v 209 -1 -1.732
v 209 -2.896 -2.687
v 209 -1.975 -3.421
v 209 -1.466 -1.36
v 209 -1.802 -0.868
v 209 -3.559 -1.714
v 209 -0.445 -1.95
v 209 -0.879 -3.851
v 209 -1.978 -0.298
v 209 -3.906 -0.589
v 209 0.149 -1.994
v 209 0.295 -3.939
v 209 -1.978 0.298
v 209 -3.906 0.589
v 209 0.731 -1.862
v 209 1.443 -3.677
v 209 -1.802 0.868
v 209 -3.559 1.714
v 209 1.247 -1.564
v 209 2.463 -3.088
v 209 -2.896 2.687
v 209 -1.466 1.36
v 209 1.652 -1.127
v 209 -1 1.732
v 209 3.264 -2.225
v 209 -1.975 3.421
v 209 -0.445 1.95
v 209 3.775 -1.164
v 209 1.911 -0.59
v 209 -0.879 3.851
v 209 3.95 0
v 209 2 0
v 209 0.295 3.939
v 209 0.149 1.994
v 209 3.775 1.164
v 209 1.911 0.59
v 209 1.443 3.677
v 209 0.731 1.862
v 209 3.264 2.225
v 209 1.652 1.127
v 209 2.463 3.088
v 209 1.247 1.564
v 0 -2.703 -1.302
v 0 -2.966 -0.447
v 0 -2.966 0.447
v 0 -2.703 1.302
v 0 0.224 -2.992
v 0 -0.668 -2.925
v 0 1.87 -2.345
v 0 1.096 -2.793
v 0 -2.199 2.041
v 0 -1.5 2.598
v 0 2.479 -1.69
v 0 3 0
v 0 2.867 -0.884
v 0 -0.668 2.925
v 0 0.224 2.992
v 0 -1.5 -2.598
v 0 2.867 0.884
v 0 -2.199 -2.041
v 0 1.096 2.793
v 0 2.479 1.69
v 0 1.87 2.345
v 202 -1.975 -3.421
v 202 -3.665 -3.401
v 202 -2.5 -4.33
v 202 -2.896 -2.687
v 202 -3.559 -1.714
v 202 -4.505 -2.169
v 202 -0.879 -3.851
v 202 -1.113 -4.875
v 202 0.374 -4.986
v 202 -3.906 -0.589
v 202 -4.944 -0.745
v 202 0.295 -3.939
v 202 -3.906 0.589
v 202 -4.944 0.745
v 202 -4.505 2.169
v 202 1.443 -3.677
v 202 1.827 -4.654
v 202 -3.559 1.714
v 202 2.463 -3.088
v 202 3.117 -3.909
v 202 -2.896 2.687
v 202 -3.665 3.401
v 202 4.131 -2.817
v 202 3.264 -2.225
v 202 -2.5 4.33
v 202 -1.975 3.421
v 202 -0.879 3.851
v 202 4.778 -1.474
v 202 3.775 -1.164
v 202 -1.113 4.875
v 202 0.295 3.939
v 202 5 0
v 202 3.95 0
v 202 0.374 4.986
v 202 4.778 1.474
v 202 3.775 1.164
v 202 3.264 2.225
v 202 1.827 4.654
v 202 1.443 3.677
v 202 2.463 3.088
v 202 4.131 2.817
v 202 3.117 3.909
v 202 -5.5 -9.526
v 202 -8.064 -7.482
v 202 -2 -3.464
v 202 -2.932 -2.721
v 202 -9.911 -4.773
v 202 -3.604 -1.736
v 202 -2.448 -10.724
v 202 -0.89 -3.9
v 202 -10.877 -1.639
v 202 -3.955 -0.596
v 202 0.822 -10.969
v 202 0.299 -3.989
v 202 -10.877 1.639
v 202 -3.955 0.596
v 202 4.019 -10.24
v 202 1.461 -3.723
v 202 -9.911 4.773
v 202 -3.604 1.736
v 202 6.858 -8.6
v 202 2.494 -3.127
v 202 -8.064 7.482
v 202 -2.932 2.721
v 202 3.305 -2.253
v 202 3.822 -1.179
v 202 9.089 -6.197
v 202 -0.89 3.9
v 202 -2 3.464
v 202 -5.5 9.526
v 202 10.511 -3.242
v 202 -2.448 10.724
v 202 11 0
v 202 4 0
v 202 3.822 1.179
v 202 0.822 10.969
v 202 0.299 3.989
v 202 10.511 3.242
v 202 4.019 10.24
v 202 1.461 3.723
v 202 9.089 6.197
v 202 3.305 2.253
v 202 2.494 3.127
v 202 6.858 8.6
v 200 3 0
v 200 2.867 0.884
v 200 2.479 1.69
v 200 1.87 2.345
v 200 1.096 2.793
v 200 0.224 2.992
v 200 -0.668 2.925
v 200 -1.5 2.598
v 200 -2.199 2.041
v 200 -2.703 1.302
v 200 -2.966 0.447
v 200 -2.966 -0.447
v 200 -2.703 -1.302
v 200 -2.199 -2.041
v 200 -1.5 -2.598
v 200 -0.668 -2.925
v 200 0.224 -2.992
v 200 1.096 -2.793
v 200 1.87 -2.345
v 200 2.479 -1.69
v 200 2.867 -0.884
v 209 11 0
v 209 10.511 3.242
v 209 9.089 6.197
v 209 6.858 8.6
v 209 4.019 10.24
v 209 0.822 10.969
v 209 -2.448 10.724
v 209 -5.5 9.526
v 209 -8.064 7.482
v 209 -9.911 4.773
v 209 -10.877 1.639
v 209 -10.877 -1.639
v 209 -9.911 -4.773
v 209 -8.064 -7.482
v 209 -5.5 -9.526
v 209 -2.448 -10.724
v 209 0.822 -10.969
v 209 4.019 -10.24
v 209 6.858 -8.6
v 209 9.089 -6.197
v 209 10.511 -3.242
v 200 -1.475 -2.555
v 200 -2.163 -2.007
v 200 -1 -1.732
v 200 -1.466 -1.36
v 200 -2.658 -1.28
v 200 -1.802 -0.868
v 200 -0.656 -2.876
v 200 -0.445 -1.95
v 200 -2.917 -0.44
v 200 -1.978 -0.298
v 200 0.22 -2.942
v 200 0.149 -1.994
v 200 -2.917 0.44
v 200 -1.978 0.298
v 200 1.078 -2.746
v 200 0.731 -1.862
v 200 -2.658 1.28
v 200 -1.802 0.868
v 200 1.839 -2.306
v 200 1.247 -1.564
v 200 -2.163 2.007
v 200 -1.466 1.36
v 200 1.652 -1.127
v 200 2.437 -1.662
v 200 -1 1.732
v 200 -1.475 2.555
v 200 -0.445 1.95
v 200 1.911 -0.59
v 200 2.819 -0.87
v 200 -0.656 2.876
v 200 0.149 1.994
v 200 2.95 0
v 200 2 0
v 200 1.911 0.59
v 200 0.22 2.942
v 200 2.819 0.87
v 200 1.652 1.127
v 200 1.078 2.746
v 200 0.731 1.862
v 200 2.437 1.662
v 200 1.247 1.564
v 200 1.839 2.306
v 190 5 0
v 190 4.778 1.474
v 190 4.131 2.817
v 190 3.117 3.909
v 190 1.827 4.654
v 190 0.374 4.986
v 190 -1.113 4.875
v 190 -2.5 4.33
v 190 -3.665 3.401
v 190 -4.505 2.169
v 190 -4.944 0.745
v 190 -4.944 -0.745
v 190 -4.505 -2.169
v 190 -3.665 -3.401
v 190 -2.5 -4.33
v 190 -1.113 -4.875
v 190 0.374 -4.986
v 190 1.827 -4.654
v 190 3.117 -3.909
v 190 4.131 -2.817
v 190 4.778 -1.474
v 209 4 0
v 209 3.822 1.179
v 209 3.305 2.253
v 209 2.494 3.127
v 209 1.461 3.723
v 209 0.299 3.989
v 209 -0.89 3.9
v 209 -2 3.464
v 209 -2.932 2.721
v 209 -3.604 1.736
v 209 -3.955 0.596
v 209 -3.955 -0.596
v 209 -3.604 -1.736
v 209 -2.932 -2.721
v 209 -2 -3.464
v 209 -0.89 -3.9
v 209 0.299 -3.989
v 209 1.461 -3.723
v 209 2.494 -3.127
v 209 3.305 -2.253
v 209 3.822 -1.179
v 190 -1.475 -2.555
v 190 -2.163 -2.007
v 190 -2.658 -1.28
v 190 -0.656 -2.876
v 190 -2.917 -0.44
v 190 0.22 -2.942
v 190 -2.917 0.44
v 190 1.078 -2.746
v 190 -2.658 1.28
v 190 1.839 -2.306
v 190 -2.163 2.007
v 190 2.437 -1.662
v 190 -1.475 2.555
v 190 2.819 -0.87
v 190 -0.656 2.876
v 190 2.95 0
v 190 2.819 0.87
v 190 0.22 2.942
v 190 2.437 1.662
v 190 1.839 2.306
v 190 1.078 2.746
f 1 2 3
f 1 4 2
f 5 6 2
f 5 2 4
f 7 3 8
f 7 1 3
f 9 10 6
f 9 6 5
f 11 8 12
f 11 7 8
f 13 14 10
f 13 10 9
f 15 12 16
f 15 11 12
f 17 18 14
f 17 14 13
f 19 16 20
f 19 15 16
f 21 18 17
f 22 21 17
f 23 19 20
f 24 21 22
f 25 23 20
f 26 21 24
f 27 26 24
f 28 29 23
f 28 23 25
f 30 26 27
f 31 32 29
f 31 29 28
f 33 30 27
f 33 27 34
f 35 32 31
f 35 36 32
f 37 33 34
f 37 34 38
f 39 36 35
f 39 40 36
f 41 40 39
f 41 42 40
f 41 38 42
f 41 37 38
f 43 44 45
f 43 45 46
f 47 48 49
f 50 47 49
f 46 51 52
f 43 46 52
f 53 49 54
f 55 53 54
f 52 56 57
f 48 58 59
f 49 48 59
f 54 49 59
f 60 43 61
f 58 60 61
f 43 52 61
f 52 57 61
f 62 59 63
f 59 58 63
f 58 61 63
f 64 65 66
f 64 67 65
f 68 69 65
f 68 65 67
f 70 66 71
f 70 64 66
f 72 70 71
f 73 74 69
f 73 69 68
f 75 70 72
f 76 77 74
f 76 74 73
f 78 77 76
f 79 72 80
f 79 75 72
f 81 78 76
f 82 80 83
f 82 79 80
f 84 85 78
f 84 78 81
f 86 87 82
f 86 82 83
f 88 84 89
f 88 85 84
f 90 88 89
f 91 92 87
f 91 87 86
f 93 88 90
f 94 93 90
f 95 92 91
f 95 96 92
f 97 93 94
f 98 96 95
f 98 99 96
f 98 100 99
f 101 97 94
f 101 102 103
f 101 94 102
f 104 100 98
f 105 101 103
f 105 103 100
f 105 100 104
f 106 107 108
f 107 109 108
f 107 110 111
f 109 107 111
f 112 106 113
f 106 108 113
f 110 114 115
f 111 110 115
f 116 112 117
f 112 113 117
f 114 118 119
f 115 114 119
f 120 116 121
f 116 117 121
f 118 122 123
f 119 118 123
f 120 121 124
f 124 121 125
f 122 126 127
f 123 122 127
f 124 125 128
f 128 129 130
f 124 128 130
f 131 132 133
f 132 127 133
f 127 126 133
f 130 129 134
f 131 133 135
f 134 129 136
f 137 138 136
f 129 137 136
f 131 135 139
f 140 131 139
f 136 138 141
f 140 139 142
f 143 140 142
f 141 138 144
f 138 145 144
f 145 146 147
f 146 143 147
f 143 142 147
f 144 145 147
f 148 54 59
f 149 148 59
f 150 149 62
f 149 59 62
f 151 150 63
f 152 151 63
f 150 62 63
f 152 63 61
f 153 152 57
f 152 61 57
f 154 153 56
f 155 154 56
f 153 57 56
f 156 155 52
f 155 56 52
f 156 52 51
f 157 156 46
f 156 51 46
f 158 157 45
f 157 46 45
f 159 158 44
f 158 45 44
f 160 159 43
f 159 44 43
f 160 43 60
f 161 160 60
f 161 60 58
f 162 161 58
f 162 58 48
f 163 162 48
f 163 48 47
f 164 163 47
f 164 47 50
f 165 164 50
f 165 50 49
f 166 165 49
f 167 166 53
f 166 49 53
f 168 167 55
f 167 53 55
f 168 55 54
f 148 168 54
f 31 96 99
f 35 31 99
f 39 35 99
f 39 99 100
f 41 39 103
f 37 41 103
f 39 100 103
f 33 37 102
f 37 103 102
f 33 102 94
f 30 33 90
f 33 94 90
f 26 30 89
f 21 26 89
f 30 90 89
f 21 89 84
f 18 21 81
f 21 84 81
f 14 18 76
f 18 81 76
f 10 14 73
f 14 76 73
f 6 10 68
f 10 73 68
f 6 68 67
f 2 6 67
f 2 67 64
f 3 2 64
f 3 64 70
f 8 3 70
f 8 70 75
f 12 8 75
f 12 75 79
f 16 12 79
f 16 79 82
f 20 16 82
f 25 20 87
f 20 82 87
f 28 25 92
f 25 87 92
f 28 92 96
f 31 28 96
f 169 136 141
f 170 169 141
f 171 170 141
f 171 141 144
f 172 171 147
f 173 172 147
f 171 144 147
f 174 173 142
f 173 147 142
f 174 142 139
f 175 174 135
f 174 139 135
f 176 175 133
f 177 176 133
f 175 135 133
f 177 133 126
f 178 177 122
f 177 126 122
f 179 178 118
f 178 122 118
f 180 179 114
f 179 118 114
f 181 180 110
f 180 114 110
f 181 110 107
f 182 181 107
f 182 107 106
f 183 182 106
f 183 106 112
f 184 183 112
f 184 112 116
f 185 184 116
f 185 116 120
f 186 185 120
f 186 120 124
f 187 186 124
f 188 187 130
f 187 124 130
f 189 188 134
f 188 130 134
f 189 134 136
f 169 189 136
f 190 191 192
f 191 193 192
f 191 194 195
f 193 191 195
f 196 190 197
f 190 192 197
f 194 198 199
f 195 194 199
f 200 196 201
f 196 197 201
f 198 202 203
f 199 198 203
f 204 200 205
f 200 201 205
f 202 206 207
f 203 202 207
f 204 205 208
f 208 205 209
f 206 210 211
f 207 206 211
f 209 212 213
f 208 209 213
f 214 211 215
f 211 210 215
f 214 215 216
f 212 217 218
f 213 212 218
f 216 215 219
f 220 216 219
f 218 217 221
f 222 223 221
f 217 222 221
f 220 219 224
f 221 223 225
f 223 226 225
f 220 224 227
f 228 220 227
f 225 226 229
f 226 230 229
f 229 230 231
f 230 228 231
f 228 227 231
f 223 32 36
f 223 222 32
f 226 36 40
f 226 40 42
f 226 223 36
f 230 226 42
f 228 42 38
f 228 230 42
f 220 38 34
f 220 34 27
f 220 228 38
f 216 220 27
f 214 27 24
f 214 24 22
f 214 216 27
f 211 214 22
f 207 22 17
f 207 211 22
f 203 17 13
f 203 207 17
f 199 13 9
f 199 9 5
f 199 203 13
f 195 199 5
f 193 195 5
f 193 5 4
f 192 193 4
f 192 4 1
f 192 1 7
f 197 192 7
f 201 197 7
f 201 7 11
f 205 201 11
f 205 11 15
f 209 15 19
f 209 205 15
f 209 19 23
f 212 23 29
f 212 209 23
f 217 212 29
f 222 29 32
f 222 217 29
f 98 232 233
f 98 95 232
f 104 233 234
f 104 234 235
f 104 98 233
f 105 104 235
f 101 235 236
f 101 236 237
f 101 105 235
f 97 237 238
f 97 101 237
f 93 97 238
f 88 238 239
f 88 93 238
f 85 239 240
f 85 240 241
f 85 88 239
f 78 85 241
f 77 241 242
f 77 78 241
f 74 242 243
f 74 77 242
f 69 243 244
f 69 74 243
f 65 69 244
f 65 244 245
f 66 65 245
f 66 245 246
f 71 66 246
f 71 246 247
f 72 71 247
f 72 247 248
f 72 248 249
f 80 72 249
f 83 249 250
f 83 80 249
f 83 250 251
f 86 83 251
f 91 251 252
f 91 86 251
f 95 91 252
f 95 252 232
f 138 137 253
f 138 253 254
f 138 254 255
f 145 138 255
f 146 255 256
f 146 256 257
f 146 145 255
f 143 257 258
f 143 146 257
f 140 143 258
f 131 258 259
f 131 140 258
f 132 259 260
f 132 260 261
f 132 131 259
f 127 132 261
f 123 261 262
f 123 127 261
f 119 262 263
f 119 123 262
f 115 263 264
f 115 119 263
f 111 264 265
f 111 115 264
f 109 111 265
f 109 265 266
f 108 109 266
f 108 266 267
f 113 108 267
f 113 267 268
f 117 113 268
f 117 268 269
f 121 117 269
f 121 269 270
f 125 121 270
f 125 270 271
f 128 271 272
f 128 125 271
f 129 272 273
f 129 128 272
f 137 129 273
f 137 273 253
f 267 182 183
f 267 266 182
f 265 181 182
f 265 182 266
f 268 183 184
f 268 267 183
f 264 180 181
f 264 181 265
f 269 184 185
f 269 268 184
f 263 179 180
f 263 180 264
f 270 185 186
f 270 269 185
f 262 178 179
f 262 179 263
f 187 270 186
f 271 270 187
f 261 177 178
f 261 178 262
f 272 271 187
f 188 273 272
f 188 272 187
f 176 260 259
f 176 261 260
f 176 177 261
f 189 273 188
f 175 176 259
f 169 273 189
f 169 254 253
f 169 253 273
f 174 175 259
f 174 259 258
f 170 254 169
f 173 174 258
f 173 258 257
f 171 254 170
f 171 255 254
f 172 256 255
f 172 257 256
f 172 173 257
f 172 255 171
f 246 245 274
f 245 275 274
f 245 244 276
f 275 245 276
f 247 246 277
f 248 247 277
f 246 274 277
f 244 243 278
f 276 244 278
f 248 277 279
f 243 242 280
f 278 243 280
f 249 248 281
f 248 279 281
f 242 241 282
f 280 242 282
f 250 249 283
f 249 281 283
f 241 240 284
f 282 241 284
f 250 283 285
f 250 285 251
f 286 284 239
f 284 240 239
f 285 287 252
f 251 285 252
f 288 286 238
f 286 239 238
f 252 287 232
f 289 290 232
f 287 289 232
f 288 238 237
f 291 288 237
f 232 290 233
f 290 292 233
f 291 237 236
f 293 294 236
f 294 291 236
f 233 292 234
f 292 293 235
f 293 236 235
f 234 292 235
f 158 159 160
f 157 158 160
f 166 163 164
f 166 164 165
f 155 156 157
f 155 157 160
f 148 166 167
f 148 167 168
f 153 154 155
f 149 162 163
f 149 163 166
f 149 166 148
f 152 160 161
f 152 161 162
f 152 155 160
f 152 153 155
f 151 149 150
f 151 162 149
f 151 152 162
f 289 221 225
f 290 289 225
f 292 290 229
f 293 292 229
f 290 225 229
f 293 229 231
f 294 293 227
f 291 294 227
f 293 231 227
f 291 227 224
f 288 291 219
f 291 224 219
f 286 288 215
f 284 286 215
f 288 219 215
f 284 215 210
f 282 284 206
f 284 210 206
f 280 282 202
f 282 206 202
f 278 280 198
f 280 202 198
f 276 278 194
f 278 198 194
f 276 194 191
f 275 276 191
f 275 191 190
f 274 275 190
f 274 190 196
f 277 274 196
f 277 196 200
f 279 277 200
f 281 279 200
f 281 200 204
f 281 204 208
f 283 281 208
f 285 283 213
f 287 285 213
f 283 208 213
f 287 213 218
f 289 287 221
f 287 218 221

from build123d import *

# Parameters (mm, degrees)
F0_R     = 3
F1_DEPTH = 200
F2_R     = 5
F2_R_2   = 3
F2_R_3   = 2.95
F2_R_4   = 2
F3_DEPTH = 2
F4_DEPTH = 10
F5_R     = 3.95
F5_R_2   = 2
F6_DEPTH = 7
F7_R     = 11
F7_R_2   = 5
F7_R_3   = 4
F8_DEPTH = 7


with BuildPart() as f1:
    # F0 (on Right) → F1 (new body)
    with BuildSketch(Plane.YZ):
        Circle(F0_R)
    extrude(amount=F1_DEPTH)


with BuildPart() as f3:
    # F2 (on face) → F3 (new body)
    with BuildSketch(Plane.YZ.offset(200)):
        Circle(F2_R)
        Circle(F2_R_2, mode=Mode.SUBTRACT)
        Circle(F2_R_2)
        Circle(F2_R_3, mode=Mode.SUBTRACT)
        Circle(F2_R_3)
        Circle(F2_R_4, mode=Mode.SUBTRACT)
    extrude(amount=F3_DEPTH)

    # F2 (on face) → F4 (join)
    with BuildSketch(Plane.YZ.offset(200)):
        Circle(F2_R)
        Circle(F2_R_2, mode=Mode.SUBTRACT)
        Circle(F2_R_2)
        Circle(F2_R_3, mode=Mode.SUBTRACT)
    extrude(amount=-F4_DEPTH)

    # F5 (on face) → F6 (join)
    with BuildSketch(Plane.YZ.offset(202)):
        Circle(F5_R)
        Circle(F5_R_2, mode=Mode.SUBTRACT)
    extrude(amount=F6_DEPTH)


with BuildPart() as f8:
    # F7 (on face) → F8 (new body)
    with BuildSketch(Plane.YZ.offset(202)):
        Circle(F7_R)
        Circle(F7_R_2, mode=Mode.SUBTRACT)
        Circle(F7_R_2)
        Circle(F7_R_3, mode=Mode.SUBTRACT)
    extrude(amount=F8_DEPTH)


solid = Compound([f1.part, f3.part, f8.part])
